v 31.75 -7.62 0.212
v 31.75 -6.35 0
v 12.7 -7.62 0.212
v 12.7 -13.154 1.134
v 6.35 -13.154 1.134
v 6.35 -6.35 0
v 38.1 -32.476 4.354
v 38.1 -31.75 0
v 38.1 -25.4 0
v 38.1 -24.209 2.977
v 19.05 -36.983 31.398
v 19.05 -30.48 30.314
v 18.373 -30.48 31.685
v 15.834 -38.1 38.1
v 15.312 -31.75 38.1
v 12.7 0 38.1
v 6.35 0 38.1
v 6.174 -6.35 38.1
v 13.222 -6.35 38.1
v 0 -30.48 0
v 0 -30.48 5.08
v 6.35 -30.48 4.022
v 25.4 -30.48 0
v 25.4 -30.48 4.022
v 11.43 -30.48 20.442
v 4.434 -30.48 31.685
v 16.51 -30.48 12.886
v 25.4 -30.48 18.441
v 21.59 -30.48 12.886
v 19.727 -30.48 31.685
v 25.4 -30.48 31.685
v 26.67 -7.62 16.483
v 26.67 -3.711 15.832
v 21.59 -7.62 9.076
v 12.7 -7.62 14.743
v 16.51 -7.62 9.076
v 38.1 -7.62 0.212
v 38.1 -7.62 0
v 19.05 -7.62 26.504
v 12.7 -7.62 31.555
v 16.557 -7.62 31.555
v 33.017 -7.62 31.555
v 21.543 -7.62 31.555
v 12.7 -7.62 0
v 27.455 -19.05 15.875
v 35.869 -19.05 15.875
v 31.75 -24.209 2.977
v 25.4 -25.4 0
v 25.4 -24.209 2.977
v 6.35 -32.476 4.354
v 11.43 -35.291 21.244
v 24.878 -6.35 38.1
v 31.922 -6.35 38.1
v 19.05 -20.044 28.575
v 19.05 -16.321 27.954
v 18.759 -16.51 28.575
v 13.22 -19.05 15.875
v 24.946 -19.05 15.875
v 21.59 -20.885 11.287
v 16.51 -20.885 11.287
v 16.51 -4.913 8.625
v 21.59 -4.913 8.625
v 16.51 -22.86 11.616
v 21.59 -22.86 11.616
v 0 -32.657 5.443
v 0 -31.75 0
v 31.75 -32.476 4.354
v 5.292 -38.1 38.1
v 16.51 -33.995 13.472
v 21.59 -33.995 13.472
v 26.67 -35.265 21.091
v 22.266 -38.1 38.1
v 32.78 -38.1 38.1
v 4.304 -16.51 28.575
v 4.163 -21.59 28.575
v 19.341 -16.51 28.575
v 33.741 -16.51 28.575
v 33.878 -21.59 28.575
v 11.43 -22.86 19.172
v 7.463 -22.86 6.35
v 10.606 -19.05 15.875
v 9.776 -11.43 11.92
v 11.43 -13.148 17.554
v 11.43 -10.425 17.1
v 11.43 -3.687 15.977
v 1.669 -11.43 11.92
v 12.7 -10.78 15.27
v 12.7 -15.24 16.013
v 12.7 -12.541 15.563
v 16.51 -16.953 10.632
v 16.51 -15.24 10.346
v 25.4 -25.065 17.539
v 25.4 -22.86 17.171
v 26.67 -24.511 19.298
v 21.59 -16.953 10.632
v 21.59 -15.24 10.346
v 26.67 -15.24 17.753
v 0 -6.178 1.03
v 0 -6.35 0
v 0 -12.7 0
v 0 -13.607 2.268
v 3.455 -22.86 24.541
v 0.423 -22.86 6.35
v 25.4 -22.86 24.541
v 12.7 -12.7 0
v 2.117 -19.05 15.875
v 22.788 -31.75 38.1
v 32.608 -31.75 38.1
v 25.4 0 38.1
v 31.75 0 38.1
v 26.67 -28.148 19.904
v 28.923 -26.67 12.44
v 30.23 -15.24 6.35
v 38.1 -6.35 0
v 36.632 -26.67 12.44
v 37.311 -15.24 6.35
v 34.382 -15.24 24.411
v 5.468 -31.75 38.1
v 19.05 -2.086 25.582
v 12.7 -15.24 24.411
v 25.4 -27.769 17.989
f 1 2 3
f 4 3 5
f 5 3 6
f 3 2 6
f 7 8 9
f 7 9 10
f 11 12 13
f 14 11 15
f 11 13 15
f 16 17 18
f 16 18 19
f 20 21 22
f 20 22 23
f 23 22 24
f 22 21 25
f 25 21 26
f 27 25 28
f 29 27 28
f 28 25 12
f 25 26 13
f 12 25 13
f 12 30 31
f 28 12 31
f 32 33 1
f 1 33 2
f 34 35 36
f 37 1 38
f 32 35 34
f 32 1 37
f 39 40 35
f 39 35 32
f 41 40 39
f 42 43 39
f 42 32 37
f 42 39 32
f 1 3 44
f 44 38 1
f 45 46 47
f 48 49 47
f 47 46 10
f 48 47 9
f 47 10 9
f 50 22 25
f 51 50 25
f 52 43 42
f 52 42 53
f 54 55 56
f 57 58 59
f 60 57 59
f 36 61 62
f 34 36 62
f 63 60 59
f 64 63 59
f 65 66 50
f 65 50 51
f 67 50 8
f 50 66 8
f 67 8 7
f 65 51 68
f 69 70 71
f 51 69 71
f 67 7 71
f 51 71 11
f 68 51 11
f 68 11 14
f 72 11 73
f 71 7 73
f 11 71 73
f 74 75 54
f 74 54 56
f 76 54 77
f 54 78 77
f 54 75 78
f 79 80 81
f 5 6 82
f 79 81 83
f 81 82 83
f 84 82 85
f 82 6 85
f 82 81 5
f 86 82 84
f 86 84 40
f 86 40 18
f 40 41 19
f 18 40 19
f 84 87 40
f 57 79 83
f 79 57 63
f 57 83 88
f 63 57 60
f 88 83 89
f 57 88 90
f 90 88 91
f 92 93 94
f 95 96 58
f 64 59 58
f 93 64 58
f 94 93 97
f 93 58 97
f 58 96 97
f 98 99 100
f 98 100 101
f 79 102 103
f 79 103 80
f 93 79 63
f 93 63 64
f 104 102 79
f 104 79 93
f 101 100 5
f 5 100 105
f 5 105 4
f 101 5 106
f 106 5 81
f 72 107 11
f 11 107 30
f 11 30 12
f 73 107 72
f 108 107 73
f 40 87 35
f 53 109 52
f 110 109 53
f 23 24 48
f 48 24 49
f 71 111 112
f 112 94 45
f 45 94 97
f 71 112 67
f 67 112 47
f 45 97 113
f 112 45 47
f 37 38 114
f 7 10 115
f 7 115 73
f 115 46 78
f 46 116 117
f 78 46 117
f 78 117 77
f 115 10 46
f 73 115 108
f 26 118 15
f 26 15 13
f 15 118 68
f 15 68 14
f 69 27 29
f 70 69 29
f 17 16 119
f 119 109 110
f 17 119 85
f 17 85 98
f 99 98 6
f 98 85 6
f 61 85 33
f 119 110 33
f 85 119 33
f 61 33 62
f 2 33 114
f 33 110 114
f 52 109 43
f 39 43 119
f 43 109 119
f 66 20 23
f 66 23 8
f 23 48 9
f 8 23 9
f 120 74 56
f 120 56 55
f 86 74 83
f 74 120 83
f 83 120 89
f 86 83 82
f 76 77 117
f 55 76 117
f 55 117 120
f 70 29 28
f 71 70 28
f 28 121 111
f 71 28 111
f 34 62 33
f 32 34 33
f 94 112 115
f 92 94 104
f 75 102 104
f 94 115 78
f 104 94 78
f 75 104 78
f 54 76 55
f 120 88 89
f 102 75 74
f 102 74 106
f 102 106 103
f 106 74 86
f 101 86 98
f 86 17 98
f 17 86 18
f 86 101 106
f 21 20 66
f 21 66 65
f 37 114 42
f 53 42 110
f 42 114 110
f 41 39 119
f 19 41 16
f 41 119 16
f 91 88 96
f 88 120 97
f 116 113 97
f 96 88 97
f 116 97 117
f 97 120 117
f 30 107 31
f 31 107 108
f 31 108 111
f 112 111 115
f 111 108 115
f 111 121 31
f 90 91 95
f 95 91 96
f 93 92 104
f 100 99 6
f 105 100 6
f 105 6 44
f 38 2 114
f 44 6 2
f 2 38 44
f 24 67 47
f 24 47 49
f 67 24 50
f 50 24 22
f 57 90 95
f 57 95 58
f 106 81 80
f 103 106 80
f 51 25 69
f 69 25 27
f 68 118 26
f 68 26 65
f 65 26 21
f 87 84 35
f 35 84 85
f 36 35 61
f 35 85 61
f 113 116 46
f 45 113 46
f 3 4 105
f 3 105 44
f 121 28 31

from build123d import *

# Parameters (mm, degrees)
F0_W     = 38.1
F0_H     = 38.0999925736
F1_DEPTH = 38.1
F4_DEPTH = 38.1
F6_DEPTH = 38.1
F7_W     = 25.4
F7_H     = 7.62
F8_DEPTH = 38.1


with BuildPart() as f1:
    # F0 (on Front) → F1 (new body)
    with BuildSketch(Plane.XZ):
        with Locations((19.05, 19.0499962868)):
            Rectangle(F0_W, F0_H)
    extrude(amount=F1_DEPTH)

    # F3 (on face) → F4 (cut)
    with BuildSketch(Plane.YZ.offset(38.1)):
        Polygon((-6.35, 38.0999925736), (-31.75, 38.0999925736), (-26.67, 12.4402772635), (-21.59, 28.575), (-16.51, 28.575), (-11.43, 11.9197117337), align=None)
        Polygon((-31.75, 0), (-38.1, 38.0999925736), (-38.1, 0), align=None)
        Polygon((-19.05, 15.875), (-25.4, 0), (-12.7, 0), align=None)
        Polygon((0, 0), (0, 38.0999925736), (-6.35, 0), align=None)
    extrude(amount=-F4_DEPTH, mode=Mode.SUBTRACT)

    # F5 (on face) → F6 (cut)
    with BuildSketch(Plane(origin=(0, -6.1783783133, 1.0297299196), x_dir=(-1, 0, 0), z_dir=(0, 0.9863939186, -0.1643990185))):
        Polygon((-26.67, 15.0061463937), (-31.75, -1.0439337674), (-6.35, -1.0439337674), (-11.43, 15.1532115415), (-16.51, 7.6999627054), (-21.59, 7.6999627054), align=None)
        Polygon((-38.1, -1.0439337674), (-31.75, 37.5816009747), (-38.1, 37.5816009747), align=None)
        Polygon((-12.7, 37.5816009747), (-25.4, 37.5816009747), (-19.05, 24.8909872025), align=None)
        Polygon((0, 37.5816009747), (-6.35, 37.5816009747), (0, 0), align=None)
    extrude(amount=-F6_DEPTH, mode=Mode.SUBTRACT)

    # F7 (on offset) → F8 (cut)
    with BuildSketch(Plane.XY.offset(38.1)):
        with Locations((25.4, -11.43)):
            Rectangle(F7_W, F7_H)
        with Locations((12.7, -26.67)):
            Rectangle(F7_W, F7_H)
    extrude(amount=-F8_DEPTH, mode=Mode.SUBTRACT)


solid = f1.part
